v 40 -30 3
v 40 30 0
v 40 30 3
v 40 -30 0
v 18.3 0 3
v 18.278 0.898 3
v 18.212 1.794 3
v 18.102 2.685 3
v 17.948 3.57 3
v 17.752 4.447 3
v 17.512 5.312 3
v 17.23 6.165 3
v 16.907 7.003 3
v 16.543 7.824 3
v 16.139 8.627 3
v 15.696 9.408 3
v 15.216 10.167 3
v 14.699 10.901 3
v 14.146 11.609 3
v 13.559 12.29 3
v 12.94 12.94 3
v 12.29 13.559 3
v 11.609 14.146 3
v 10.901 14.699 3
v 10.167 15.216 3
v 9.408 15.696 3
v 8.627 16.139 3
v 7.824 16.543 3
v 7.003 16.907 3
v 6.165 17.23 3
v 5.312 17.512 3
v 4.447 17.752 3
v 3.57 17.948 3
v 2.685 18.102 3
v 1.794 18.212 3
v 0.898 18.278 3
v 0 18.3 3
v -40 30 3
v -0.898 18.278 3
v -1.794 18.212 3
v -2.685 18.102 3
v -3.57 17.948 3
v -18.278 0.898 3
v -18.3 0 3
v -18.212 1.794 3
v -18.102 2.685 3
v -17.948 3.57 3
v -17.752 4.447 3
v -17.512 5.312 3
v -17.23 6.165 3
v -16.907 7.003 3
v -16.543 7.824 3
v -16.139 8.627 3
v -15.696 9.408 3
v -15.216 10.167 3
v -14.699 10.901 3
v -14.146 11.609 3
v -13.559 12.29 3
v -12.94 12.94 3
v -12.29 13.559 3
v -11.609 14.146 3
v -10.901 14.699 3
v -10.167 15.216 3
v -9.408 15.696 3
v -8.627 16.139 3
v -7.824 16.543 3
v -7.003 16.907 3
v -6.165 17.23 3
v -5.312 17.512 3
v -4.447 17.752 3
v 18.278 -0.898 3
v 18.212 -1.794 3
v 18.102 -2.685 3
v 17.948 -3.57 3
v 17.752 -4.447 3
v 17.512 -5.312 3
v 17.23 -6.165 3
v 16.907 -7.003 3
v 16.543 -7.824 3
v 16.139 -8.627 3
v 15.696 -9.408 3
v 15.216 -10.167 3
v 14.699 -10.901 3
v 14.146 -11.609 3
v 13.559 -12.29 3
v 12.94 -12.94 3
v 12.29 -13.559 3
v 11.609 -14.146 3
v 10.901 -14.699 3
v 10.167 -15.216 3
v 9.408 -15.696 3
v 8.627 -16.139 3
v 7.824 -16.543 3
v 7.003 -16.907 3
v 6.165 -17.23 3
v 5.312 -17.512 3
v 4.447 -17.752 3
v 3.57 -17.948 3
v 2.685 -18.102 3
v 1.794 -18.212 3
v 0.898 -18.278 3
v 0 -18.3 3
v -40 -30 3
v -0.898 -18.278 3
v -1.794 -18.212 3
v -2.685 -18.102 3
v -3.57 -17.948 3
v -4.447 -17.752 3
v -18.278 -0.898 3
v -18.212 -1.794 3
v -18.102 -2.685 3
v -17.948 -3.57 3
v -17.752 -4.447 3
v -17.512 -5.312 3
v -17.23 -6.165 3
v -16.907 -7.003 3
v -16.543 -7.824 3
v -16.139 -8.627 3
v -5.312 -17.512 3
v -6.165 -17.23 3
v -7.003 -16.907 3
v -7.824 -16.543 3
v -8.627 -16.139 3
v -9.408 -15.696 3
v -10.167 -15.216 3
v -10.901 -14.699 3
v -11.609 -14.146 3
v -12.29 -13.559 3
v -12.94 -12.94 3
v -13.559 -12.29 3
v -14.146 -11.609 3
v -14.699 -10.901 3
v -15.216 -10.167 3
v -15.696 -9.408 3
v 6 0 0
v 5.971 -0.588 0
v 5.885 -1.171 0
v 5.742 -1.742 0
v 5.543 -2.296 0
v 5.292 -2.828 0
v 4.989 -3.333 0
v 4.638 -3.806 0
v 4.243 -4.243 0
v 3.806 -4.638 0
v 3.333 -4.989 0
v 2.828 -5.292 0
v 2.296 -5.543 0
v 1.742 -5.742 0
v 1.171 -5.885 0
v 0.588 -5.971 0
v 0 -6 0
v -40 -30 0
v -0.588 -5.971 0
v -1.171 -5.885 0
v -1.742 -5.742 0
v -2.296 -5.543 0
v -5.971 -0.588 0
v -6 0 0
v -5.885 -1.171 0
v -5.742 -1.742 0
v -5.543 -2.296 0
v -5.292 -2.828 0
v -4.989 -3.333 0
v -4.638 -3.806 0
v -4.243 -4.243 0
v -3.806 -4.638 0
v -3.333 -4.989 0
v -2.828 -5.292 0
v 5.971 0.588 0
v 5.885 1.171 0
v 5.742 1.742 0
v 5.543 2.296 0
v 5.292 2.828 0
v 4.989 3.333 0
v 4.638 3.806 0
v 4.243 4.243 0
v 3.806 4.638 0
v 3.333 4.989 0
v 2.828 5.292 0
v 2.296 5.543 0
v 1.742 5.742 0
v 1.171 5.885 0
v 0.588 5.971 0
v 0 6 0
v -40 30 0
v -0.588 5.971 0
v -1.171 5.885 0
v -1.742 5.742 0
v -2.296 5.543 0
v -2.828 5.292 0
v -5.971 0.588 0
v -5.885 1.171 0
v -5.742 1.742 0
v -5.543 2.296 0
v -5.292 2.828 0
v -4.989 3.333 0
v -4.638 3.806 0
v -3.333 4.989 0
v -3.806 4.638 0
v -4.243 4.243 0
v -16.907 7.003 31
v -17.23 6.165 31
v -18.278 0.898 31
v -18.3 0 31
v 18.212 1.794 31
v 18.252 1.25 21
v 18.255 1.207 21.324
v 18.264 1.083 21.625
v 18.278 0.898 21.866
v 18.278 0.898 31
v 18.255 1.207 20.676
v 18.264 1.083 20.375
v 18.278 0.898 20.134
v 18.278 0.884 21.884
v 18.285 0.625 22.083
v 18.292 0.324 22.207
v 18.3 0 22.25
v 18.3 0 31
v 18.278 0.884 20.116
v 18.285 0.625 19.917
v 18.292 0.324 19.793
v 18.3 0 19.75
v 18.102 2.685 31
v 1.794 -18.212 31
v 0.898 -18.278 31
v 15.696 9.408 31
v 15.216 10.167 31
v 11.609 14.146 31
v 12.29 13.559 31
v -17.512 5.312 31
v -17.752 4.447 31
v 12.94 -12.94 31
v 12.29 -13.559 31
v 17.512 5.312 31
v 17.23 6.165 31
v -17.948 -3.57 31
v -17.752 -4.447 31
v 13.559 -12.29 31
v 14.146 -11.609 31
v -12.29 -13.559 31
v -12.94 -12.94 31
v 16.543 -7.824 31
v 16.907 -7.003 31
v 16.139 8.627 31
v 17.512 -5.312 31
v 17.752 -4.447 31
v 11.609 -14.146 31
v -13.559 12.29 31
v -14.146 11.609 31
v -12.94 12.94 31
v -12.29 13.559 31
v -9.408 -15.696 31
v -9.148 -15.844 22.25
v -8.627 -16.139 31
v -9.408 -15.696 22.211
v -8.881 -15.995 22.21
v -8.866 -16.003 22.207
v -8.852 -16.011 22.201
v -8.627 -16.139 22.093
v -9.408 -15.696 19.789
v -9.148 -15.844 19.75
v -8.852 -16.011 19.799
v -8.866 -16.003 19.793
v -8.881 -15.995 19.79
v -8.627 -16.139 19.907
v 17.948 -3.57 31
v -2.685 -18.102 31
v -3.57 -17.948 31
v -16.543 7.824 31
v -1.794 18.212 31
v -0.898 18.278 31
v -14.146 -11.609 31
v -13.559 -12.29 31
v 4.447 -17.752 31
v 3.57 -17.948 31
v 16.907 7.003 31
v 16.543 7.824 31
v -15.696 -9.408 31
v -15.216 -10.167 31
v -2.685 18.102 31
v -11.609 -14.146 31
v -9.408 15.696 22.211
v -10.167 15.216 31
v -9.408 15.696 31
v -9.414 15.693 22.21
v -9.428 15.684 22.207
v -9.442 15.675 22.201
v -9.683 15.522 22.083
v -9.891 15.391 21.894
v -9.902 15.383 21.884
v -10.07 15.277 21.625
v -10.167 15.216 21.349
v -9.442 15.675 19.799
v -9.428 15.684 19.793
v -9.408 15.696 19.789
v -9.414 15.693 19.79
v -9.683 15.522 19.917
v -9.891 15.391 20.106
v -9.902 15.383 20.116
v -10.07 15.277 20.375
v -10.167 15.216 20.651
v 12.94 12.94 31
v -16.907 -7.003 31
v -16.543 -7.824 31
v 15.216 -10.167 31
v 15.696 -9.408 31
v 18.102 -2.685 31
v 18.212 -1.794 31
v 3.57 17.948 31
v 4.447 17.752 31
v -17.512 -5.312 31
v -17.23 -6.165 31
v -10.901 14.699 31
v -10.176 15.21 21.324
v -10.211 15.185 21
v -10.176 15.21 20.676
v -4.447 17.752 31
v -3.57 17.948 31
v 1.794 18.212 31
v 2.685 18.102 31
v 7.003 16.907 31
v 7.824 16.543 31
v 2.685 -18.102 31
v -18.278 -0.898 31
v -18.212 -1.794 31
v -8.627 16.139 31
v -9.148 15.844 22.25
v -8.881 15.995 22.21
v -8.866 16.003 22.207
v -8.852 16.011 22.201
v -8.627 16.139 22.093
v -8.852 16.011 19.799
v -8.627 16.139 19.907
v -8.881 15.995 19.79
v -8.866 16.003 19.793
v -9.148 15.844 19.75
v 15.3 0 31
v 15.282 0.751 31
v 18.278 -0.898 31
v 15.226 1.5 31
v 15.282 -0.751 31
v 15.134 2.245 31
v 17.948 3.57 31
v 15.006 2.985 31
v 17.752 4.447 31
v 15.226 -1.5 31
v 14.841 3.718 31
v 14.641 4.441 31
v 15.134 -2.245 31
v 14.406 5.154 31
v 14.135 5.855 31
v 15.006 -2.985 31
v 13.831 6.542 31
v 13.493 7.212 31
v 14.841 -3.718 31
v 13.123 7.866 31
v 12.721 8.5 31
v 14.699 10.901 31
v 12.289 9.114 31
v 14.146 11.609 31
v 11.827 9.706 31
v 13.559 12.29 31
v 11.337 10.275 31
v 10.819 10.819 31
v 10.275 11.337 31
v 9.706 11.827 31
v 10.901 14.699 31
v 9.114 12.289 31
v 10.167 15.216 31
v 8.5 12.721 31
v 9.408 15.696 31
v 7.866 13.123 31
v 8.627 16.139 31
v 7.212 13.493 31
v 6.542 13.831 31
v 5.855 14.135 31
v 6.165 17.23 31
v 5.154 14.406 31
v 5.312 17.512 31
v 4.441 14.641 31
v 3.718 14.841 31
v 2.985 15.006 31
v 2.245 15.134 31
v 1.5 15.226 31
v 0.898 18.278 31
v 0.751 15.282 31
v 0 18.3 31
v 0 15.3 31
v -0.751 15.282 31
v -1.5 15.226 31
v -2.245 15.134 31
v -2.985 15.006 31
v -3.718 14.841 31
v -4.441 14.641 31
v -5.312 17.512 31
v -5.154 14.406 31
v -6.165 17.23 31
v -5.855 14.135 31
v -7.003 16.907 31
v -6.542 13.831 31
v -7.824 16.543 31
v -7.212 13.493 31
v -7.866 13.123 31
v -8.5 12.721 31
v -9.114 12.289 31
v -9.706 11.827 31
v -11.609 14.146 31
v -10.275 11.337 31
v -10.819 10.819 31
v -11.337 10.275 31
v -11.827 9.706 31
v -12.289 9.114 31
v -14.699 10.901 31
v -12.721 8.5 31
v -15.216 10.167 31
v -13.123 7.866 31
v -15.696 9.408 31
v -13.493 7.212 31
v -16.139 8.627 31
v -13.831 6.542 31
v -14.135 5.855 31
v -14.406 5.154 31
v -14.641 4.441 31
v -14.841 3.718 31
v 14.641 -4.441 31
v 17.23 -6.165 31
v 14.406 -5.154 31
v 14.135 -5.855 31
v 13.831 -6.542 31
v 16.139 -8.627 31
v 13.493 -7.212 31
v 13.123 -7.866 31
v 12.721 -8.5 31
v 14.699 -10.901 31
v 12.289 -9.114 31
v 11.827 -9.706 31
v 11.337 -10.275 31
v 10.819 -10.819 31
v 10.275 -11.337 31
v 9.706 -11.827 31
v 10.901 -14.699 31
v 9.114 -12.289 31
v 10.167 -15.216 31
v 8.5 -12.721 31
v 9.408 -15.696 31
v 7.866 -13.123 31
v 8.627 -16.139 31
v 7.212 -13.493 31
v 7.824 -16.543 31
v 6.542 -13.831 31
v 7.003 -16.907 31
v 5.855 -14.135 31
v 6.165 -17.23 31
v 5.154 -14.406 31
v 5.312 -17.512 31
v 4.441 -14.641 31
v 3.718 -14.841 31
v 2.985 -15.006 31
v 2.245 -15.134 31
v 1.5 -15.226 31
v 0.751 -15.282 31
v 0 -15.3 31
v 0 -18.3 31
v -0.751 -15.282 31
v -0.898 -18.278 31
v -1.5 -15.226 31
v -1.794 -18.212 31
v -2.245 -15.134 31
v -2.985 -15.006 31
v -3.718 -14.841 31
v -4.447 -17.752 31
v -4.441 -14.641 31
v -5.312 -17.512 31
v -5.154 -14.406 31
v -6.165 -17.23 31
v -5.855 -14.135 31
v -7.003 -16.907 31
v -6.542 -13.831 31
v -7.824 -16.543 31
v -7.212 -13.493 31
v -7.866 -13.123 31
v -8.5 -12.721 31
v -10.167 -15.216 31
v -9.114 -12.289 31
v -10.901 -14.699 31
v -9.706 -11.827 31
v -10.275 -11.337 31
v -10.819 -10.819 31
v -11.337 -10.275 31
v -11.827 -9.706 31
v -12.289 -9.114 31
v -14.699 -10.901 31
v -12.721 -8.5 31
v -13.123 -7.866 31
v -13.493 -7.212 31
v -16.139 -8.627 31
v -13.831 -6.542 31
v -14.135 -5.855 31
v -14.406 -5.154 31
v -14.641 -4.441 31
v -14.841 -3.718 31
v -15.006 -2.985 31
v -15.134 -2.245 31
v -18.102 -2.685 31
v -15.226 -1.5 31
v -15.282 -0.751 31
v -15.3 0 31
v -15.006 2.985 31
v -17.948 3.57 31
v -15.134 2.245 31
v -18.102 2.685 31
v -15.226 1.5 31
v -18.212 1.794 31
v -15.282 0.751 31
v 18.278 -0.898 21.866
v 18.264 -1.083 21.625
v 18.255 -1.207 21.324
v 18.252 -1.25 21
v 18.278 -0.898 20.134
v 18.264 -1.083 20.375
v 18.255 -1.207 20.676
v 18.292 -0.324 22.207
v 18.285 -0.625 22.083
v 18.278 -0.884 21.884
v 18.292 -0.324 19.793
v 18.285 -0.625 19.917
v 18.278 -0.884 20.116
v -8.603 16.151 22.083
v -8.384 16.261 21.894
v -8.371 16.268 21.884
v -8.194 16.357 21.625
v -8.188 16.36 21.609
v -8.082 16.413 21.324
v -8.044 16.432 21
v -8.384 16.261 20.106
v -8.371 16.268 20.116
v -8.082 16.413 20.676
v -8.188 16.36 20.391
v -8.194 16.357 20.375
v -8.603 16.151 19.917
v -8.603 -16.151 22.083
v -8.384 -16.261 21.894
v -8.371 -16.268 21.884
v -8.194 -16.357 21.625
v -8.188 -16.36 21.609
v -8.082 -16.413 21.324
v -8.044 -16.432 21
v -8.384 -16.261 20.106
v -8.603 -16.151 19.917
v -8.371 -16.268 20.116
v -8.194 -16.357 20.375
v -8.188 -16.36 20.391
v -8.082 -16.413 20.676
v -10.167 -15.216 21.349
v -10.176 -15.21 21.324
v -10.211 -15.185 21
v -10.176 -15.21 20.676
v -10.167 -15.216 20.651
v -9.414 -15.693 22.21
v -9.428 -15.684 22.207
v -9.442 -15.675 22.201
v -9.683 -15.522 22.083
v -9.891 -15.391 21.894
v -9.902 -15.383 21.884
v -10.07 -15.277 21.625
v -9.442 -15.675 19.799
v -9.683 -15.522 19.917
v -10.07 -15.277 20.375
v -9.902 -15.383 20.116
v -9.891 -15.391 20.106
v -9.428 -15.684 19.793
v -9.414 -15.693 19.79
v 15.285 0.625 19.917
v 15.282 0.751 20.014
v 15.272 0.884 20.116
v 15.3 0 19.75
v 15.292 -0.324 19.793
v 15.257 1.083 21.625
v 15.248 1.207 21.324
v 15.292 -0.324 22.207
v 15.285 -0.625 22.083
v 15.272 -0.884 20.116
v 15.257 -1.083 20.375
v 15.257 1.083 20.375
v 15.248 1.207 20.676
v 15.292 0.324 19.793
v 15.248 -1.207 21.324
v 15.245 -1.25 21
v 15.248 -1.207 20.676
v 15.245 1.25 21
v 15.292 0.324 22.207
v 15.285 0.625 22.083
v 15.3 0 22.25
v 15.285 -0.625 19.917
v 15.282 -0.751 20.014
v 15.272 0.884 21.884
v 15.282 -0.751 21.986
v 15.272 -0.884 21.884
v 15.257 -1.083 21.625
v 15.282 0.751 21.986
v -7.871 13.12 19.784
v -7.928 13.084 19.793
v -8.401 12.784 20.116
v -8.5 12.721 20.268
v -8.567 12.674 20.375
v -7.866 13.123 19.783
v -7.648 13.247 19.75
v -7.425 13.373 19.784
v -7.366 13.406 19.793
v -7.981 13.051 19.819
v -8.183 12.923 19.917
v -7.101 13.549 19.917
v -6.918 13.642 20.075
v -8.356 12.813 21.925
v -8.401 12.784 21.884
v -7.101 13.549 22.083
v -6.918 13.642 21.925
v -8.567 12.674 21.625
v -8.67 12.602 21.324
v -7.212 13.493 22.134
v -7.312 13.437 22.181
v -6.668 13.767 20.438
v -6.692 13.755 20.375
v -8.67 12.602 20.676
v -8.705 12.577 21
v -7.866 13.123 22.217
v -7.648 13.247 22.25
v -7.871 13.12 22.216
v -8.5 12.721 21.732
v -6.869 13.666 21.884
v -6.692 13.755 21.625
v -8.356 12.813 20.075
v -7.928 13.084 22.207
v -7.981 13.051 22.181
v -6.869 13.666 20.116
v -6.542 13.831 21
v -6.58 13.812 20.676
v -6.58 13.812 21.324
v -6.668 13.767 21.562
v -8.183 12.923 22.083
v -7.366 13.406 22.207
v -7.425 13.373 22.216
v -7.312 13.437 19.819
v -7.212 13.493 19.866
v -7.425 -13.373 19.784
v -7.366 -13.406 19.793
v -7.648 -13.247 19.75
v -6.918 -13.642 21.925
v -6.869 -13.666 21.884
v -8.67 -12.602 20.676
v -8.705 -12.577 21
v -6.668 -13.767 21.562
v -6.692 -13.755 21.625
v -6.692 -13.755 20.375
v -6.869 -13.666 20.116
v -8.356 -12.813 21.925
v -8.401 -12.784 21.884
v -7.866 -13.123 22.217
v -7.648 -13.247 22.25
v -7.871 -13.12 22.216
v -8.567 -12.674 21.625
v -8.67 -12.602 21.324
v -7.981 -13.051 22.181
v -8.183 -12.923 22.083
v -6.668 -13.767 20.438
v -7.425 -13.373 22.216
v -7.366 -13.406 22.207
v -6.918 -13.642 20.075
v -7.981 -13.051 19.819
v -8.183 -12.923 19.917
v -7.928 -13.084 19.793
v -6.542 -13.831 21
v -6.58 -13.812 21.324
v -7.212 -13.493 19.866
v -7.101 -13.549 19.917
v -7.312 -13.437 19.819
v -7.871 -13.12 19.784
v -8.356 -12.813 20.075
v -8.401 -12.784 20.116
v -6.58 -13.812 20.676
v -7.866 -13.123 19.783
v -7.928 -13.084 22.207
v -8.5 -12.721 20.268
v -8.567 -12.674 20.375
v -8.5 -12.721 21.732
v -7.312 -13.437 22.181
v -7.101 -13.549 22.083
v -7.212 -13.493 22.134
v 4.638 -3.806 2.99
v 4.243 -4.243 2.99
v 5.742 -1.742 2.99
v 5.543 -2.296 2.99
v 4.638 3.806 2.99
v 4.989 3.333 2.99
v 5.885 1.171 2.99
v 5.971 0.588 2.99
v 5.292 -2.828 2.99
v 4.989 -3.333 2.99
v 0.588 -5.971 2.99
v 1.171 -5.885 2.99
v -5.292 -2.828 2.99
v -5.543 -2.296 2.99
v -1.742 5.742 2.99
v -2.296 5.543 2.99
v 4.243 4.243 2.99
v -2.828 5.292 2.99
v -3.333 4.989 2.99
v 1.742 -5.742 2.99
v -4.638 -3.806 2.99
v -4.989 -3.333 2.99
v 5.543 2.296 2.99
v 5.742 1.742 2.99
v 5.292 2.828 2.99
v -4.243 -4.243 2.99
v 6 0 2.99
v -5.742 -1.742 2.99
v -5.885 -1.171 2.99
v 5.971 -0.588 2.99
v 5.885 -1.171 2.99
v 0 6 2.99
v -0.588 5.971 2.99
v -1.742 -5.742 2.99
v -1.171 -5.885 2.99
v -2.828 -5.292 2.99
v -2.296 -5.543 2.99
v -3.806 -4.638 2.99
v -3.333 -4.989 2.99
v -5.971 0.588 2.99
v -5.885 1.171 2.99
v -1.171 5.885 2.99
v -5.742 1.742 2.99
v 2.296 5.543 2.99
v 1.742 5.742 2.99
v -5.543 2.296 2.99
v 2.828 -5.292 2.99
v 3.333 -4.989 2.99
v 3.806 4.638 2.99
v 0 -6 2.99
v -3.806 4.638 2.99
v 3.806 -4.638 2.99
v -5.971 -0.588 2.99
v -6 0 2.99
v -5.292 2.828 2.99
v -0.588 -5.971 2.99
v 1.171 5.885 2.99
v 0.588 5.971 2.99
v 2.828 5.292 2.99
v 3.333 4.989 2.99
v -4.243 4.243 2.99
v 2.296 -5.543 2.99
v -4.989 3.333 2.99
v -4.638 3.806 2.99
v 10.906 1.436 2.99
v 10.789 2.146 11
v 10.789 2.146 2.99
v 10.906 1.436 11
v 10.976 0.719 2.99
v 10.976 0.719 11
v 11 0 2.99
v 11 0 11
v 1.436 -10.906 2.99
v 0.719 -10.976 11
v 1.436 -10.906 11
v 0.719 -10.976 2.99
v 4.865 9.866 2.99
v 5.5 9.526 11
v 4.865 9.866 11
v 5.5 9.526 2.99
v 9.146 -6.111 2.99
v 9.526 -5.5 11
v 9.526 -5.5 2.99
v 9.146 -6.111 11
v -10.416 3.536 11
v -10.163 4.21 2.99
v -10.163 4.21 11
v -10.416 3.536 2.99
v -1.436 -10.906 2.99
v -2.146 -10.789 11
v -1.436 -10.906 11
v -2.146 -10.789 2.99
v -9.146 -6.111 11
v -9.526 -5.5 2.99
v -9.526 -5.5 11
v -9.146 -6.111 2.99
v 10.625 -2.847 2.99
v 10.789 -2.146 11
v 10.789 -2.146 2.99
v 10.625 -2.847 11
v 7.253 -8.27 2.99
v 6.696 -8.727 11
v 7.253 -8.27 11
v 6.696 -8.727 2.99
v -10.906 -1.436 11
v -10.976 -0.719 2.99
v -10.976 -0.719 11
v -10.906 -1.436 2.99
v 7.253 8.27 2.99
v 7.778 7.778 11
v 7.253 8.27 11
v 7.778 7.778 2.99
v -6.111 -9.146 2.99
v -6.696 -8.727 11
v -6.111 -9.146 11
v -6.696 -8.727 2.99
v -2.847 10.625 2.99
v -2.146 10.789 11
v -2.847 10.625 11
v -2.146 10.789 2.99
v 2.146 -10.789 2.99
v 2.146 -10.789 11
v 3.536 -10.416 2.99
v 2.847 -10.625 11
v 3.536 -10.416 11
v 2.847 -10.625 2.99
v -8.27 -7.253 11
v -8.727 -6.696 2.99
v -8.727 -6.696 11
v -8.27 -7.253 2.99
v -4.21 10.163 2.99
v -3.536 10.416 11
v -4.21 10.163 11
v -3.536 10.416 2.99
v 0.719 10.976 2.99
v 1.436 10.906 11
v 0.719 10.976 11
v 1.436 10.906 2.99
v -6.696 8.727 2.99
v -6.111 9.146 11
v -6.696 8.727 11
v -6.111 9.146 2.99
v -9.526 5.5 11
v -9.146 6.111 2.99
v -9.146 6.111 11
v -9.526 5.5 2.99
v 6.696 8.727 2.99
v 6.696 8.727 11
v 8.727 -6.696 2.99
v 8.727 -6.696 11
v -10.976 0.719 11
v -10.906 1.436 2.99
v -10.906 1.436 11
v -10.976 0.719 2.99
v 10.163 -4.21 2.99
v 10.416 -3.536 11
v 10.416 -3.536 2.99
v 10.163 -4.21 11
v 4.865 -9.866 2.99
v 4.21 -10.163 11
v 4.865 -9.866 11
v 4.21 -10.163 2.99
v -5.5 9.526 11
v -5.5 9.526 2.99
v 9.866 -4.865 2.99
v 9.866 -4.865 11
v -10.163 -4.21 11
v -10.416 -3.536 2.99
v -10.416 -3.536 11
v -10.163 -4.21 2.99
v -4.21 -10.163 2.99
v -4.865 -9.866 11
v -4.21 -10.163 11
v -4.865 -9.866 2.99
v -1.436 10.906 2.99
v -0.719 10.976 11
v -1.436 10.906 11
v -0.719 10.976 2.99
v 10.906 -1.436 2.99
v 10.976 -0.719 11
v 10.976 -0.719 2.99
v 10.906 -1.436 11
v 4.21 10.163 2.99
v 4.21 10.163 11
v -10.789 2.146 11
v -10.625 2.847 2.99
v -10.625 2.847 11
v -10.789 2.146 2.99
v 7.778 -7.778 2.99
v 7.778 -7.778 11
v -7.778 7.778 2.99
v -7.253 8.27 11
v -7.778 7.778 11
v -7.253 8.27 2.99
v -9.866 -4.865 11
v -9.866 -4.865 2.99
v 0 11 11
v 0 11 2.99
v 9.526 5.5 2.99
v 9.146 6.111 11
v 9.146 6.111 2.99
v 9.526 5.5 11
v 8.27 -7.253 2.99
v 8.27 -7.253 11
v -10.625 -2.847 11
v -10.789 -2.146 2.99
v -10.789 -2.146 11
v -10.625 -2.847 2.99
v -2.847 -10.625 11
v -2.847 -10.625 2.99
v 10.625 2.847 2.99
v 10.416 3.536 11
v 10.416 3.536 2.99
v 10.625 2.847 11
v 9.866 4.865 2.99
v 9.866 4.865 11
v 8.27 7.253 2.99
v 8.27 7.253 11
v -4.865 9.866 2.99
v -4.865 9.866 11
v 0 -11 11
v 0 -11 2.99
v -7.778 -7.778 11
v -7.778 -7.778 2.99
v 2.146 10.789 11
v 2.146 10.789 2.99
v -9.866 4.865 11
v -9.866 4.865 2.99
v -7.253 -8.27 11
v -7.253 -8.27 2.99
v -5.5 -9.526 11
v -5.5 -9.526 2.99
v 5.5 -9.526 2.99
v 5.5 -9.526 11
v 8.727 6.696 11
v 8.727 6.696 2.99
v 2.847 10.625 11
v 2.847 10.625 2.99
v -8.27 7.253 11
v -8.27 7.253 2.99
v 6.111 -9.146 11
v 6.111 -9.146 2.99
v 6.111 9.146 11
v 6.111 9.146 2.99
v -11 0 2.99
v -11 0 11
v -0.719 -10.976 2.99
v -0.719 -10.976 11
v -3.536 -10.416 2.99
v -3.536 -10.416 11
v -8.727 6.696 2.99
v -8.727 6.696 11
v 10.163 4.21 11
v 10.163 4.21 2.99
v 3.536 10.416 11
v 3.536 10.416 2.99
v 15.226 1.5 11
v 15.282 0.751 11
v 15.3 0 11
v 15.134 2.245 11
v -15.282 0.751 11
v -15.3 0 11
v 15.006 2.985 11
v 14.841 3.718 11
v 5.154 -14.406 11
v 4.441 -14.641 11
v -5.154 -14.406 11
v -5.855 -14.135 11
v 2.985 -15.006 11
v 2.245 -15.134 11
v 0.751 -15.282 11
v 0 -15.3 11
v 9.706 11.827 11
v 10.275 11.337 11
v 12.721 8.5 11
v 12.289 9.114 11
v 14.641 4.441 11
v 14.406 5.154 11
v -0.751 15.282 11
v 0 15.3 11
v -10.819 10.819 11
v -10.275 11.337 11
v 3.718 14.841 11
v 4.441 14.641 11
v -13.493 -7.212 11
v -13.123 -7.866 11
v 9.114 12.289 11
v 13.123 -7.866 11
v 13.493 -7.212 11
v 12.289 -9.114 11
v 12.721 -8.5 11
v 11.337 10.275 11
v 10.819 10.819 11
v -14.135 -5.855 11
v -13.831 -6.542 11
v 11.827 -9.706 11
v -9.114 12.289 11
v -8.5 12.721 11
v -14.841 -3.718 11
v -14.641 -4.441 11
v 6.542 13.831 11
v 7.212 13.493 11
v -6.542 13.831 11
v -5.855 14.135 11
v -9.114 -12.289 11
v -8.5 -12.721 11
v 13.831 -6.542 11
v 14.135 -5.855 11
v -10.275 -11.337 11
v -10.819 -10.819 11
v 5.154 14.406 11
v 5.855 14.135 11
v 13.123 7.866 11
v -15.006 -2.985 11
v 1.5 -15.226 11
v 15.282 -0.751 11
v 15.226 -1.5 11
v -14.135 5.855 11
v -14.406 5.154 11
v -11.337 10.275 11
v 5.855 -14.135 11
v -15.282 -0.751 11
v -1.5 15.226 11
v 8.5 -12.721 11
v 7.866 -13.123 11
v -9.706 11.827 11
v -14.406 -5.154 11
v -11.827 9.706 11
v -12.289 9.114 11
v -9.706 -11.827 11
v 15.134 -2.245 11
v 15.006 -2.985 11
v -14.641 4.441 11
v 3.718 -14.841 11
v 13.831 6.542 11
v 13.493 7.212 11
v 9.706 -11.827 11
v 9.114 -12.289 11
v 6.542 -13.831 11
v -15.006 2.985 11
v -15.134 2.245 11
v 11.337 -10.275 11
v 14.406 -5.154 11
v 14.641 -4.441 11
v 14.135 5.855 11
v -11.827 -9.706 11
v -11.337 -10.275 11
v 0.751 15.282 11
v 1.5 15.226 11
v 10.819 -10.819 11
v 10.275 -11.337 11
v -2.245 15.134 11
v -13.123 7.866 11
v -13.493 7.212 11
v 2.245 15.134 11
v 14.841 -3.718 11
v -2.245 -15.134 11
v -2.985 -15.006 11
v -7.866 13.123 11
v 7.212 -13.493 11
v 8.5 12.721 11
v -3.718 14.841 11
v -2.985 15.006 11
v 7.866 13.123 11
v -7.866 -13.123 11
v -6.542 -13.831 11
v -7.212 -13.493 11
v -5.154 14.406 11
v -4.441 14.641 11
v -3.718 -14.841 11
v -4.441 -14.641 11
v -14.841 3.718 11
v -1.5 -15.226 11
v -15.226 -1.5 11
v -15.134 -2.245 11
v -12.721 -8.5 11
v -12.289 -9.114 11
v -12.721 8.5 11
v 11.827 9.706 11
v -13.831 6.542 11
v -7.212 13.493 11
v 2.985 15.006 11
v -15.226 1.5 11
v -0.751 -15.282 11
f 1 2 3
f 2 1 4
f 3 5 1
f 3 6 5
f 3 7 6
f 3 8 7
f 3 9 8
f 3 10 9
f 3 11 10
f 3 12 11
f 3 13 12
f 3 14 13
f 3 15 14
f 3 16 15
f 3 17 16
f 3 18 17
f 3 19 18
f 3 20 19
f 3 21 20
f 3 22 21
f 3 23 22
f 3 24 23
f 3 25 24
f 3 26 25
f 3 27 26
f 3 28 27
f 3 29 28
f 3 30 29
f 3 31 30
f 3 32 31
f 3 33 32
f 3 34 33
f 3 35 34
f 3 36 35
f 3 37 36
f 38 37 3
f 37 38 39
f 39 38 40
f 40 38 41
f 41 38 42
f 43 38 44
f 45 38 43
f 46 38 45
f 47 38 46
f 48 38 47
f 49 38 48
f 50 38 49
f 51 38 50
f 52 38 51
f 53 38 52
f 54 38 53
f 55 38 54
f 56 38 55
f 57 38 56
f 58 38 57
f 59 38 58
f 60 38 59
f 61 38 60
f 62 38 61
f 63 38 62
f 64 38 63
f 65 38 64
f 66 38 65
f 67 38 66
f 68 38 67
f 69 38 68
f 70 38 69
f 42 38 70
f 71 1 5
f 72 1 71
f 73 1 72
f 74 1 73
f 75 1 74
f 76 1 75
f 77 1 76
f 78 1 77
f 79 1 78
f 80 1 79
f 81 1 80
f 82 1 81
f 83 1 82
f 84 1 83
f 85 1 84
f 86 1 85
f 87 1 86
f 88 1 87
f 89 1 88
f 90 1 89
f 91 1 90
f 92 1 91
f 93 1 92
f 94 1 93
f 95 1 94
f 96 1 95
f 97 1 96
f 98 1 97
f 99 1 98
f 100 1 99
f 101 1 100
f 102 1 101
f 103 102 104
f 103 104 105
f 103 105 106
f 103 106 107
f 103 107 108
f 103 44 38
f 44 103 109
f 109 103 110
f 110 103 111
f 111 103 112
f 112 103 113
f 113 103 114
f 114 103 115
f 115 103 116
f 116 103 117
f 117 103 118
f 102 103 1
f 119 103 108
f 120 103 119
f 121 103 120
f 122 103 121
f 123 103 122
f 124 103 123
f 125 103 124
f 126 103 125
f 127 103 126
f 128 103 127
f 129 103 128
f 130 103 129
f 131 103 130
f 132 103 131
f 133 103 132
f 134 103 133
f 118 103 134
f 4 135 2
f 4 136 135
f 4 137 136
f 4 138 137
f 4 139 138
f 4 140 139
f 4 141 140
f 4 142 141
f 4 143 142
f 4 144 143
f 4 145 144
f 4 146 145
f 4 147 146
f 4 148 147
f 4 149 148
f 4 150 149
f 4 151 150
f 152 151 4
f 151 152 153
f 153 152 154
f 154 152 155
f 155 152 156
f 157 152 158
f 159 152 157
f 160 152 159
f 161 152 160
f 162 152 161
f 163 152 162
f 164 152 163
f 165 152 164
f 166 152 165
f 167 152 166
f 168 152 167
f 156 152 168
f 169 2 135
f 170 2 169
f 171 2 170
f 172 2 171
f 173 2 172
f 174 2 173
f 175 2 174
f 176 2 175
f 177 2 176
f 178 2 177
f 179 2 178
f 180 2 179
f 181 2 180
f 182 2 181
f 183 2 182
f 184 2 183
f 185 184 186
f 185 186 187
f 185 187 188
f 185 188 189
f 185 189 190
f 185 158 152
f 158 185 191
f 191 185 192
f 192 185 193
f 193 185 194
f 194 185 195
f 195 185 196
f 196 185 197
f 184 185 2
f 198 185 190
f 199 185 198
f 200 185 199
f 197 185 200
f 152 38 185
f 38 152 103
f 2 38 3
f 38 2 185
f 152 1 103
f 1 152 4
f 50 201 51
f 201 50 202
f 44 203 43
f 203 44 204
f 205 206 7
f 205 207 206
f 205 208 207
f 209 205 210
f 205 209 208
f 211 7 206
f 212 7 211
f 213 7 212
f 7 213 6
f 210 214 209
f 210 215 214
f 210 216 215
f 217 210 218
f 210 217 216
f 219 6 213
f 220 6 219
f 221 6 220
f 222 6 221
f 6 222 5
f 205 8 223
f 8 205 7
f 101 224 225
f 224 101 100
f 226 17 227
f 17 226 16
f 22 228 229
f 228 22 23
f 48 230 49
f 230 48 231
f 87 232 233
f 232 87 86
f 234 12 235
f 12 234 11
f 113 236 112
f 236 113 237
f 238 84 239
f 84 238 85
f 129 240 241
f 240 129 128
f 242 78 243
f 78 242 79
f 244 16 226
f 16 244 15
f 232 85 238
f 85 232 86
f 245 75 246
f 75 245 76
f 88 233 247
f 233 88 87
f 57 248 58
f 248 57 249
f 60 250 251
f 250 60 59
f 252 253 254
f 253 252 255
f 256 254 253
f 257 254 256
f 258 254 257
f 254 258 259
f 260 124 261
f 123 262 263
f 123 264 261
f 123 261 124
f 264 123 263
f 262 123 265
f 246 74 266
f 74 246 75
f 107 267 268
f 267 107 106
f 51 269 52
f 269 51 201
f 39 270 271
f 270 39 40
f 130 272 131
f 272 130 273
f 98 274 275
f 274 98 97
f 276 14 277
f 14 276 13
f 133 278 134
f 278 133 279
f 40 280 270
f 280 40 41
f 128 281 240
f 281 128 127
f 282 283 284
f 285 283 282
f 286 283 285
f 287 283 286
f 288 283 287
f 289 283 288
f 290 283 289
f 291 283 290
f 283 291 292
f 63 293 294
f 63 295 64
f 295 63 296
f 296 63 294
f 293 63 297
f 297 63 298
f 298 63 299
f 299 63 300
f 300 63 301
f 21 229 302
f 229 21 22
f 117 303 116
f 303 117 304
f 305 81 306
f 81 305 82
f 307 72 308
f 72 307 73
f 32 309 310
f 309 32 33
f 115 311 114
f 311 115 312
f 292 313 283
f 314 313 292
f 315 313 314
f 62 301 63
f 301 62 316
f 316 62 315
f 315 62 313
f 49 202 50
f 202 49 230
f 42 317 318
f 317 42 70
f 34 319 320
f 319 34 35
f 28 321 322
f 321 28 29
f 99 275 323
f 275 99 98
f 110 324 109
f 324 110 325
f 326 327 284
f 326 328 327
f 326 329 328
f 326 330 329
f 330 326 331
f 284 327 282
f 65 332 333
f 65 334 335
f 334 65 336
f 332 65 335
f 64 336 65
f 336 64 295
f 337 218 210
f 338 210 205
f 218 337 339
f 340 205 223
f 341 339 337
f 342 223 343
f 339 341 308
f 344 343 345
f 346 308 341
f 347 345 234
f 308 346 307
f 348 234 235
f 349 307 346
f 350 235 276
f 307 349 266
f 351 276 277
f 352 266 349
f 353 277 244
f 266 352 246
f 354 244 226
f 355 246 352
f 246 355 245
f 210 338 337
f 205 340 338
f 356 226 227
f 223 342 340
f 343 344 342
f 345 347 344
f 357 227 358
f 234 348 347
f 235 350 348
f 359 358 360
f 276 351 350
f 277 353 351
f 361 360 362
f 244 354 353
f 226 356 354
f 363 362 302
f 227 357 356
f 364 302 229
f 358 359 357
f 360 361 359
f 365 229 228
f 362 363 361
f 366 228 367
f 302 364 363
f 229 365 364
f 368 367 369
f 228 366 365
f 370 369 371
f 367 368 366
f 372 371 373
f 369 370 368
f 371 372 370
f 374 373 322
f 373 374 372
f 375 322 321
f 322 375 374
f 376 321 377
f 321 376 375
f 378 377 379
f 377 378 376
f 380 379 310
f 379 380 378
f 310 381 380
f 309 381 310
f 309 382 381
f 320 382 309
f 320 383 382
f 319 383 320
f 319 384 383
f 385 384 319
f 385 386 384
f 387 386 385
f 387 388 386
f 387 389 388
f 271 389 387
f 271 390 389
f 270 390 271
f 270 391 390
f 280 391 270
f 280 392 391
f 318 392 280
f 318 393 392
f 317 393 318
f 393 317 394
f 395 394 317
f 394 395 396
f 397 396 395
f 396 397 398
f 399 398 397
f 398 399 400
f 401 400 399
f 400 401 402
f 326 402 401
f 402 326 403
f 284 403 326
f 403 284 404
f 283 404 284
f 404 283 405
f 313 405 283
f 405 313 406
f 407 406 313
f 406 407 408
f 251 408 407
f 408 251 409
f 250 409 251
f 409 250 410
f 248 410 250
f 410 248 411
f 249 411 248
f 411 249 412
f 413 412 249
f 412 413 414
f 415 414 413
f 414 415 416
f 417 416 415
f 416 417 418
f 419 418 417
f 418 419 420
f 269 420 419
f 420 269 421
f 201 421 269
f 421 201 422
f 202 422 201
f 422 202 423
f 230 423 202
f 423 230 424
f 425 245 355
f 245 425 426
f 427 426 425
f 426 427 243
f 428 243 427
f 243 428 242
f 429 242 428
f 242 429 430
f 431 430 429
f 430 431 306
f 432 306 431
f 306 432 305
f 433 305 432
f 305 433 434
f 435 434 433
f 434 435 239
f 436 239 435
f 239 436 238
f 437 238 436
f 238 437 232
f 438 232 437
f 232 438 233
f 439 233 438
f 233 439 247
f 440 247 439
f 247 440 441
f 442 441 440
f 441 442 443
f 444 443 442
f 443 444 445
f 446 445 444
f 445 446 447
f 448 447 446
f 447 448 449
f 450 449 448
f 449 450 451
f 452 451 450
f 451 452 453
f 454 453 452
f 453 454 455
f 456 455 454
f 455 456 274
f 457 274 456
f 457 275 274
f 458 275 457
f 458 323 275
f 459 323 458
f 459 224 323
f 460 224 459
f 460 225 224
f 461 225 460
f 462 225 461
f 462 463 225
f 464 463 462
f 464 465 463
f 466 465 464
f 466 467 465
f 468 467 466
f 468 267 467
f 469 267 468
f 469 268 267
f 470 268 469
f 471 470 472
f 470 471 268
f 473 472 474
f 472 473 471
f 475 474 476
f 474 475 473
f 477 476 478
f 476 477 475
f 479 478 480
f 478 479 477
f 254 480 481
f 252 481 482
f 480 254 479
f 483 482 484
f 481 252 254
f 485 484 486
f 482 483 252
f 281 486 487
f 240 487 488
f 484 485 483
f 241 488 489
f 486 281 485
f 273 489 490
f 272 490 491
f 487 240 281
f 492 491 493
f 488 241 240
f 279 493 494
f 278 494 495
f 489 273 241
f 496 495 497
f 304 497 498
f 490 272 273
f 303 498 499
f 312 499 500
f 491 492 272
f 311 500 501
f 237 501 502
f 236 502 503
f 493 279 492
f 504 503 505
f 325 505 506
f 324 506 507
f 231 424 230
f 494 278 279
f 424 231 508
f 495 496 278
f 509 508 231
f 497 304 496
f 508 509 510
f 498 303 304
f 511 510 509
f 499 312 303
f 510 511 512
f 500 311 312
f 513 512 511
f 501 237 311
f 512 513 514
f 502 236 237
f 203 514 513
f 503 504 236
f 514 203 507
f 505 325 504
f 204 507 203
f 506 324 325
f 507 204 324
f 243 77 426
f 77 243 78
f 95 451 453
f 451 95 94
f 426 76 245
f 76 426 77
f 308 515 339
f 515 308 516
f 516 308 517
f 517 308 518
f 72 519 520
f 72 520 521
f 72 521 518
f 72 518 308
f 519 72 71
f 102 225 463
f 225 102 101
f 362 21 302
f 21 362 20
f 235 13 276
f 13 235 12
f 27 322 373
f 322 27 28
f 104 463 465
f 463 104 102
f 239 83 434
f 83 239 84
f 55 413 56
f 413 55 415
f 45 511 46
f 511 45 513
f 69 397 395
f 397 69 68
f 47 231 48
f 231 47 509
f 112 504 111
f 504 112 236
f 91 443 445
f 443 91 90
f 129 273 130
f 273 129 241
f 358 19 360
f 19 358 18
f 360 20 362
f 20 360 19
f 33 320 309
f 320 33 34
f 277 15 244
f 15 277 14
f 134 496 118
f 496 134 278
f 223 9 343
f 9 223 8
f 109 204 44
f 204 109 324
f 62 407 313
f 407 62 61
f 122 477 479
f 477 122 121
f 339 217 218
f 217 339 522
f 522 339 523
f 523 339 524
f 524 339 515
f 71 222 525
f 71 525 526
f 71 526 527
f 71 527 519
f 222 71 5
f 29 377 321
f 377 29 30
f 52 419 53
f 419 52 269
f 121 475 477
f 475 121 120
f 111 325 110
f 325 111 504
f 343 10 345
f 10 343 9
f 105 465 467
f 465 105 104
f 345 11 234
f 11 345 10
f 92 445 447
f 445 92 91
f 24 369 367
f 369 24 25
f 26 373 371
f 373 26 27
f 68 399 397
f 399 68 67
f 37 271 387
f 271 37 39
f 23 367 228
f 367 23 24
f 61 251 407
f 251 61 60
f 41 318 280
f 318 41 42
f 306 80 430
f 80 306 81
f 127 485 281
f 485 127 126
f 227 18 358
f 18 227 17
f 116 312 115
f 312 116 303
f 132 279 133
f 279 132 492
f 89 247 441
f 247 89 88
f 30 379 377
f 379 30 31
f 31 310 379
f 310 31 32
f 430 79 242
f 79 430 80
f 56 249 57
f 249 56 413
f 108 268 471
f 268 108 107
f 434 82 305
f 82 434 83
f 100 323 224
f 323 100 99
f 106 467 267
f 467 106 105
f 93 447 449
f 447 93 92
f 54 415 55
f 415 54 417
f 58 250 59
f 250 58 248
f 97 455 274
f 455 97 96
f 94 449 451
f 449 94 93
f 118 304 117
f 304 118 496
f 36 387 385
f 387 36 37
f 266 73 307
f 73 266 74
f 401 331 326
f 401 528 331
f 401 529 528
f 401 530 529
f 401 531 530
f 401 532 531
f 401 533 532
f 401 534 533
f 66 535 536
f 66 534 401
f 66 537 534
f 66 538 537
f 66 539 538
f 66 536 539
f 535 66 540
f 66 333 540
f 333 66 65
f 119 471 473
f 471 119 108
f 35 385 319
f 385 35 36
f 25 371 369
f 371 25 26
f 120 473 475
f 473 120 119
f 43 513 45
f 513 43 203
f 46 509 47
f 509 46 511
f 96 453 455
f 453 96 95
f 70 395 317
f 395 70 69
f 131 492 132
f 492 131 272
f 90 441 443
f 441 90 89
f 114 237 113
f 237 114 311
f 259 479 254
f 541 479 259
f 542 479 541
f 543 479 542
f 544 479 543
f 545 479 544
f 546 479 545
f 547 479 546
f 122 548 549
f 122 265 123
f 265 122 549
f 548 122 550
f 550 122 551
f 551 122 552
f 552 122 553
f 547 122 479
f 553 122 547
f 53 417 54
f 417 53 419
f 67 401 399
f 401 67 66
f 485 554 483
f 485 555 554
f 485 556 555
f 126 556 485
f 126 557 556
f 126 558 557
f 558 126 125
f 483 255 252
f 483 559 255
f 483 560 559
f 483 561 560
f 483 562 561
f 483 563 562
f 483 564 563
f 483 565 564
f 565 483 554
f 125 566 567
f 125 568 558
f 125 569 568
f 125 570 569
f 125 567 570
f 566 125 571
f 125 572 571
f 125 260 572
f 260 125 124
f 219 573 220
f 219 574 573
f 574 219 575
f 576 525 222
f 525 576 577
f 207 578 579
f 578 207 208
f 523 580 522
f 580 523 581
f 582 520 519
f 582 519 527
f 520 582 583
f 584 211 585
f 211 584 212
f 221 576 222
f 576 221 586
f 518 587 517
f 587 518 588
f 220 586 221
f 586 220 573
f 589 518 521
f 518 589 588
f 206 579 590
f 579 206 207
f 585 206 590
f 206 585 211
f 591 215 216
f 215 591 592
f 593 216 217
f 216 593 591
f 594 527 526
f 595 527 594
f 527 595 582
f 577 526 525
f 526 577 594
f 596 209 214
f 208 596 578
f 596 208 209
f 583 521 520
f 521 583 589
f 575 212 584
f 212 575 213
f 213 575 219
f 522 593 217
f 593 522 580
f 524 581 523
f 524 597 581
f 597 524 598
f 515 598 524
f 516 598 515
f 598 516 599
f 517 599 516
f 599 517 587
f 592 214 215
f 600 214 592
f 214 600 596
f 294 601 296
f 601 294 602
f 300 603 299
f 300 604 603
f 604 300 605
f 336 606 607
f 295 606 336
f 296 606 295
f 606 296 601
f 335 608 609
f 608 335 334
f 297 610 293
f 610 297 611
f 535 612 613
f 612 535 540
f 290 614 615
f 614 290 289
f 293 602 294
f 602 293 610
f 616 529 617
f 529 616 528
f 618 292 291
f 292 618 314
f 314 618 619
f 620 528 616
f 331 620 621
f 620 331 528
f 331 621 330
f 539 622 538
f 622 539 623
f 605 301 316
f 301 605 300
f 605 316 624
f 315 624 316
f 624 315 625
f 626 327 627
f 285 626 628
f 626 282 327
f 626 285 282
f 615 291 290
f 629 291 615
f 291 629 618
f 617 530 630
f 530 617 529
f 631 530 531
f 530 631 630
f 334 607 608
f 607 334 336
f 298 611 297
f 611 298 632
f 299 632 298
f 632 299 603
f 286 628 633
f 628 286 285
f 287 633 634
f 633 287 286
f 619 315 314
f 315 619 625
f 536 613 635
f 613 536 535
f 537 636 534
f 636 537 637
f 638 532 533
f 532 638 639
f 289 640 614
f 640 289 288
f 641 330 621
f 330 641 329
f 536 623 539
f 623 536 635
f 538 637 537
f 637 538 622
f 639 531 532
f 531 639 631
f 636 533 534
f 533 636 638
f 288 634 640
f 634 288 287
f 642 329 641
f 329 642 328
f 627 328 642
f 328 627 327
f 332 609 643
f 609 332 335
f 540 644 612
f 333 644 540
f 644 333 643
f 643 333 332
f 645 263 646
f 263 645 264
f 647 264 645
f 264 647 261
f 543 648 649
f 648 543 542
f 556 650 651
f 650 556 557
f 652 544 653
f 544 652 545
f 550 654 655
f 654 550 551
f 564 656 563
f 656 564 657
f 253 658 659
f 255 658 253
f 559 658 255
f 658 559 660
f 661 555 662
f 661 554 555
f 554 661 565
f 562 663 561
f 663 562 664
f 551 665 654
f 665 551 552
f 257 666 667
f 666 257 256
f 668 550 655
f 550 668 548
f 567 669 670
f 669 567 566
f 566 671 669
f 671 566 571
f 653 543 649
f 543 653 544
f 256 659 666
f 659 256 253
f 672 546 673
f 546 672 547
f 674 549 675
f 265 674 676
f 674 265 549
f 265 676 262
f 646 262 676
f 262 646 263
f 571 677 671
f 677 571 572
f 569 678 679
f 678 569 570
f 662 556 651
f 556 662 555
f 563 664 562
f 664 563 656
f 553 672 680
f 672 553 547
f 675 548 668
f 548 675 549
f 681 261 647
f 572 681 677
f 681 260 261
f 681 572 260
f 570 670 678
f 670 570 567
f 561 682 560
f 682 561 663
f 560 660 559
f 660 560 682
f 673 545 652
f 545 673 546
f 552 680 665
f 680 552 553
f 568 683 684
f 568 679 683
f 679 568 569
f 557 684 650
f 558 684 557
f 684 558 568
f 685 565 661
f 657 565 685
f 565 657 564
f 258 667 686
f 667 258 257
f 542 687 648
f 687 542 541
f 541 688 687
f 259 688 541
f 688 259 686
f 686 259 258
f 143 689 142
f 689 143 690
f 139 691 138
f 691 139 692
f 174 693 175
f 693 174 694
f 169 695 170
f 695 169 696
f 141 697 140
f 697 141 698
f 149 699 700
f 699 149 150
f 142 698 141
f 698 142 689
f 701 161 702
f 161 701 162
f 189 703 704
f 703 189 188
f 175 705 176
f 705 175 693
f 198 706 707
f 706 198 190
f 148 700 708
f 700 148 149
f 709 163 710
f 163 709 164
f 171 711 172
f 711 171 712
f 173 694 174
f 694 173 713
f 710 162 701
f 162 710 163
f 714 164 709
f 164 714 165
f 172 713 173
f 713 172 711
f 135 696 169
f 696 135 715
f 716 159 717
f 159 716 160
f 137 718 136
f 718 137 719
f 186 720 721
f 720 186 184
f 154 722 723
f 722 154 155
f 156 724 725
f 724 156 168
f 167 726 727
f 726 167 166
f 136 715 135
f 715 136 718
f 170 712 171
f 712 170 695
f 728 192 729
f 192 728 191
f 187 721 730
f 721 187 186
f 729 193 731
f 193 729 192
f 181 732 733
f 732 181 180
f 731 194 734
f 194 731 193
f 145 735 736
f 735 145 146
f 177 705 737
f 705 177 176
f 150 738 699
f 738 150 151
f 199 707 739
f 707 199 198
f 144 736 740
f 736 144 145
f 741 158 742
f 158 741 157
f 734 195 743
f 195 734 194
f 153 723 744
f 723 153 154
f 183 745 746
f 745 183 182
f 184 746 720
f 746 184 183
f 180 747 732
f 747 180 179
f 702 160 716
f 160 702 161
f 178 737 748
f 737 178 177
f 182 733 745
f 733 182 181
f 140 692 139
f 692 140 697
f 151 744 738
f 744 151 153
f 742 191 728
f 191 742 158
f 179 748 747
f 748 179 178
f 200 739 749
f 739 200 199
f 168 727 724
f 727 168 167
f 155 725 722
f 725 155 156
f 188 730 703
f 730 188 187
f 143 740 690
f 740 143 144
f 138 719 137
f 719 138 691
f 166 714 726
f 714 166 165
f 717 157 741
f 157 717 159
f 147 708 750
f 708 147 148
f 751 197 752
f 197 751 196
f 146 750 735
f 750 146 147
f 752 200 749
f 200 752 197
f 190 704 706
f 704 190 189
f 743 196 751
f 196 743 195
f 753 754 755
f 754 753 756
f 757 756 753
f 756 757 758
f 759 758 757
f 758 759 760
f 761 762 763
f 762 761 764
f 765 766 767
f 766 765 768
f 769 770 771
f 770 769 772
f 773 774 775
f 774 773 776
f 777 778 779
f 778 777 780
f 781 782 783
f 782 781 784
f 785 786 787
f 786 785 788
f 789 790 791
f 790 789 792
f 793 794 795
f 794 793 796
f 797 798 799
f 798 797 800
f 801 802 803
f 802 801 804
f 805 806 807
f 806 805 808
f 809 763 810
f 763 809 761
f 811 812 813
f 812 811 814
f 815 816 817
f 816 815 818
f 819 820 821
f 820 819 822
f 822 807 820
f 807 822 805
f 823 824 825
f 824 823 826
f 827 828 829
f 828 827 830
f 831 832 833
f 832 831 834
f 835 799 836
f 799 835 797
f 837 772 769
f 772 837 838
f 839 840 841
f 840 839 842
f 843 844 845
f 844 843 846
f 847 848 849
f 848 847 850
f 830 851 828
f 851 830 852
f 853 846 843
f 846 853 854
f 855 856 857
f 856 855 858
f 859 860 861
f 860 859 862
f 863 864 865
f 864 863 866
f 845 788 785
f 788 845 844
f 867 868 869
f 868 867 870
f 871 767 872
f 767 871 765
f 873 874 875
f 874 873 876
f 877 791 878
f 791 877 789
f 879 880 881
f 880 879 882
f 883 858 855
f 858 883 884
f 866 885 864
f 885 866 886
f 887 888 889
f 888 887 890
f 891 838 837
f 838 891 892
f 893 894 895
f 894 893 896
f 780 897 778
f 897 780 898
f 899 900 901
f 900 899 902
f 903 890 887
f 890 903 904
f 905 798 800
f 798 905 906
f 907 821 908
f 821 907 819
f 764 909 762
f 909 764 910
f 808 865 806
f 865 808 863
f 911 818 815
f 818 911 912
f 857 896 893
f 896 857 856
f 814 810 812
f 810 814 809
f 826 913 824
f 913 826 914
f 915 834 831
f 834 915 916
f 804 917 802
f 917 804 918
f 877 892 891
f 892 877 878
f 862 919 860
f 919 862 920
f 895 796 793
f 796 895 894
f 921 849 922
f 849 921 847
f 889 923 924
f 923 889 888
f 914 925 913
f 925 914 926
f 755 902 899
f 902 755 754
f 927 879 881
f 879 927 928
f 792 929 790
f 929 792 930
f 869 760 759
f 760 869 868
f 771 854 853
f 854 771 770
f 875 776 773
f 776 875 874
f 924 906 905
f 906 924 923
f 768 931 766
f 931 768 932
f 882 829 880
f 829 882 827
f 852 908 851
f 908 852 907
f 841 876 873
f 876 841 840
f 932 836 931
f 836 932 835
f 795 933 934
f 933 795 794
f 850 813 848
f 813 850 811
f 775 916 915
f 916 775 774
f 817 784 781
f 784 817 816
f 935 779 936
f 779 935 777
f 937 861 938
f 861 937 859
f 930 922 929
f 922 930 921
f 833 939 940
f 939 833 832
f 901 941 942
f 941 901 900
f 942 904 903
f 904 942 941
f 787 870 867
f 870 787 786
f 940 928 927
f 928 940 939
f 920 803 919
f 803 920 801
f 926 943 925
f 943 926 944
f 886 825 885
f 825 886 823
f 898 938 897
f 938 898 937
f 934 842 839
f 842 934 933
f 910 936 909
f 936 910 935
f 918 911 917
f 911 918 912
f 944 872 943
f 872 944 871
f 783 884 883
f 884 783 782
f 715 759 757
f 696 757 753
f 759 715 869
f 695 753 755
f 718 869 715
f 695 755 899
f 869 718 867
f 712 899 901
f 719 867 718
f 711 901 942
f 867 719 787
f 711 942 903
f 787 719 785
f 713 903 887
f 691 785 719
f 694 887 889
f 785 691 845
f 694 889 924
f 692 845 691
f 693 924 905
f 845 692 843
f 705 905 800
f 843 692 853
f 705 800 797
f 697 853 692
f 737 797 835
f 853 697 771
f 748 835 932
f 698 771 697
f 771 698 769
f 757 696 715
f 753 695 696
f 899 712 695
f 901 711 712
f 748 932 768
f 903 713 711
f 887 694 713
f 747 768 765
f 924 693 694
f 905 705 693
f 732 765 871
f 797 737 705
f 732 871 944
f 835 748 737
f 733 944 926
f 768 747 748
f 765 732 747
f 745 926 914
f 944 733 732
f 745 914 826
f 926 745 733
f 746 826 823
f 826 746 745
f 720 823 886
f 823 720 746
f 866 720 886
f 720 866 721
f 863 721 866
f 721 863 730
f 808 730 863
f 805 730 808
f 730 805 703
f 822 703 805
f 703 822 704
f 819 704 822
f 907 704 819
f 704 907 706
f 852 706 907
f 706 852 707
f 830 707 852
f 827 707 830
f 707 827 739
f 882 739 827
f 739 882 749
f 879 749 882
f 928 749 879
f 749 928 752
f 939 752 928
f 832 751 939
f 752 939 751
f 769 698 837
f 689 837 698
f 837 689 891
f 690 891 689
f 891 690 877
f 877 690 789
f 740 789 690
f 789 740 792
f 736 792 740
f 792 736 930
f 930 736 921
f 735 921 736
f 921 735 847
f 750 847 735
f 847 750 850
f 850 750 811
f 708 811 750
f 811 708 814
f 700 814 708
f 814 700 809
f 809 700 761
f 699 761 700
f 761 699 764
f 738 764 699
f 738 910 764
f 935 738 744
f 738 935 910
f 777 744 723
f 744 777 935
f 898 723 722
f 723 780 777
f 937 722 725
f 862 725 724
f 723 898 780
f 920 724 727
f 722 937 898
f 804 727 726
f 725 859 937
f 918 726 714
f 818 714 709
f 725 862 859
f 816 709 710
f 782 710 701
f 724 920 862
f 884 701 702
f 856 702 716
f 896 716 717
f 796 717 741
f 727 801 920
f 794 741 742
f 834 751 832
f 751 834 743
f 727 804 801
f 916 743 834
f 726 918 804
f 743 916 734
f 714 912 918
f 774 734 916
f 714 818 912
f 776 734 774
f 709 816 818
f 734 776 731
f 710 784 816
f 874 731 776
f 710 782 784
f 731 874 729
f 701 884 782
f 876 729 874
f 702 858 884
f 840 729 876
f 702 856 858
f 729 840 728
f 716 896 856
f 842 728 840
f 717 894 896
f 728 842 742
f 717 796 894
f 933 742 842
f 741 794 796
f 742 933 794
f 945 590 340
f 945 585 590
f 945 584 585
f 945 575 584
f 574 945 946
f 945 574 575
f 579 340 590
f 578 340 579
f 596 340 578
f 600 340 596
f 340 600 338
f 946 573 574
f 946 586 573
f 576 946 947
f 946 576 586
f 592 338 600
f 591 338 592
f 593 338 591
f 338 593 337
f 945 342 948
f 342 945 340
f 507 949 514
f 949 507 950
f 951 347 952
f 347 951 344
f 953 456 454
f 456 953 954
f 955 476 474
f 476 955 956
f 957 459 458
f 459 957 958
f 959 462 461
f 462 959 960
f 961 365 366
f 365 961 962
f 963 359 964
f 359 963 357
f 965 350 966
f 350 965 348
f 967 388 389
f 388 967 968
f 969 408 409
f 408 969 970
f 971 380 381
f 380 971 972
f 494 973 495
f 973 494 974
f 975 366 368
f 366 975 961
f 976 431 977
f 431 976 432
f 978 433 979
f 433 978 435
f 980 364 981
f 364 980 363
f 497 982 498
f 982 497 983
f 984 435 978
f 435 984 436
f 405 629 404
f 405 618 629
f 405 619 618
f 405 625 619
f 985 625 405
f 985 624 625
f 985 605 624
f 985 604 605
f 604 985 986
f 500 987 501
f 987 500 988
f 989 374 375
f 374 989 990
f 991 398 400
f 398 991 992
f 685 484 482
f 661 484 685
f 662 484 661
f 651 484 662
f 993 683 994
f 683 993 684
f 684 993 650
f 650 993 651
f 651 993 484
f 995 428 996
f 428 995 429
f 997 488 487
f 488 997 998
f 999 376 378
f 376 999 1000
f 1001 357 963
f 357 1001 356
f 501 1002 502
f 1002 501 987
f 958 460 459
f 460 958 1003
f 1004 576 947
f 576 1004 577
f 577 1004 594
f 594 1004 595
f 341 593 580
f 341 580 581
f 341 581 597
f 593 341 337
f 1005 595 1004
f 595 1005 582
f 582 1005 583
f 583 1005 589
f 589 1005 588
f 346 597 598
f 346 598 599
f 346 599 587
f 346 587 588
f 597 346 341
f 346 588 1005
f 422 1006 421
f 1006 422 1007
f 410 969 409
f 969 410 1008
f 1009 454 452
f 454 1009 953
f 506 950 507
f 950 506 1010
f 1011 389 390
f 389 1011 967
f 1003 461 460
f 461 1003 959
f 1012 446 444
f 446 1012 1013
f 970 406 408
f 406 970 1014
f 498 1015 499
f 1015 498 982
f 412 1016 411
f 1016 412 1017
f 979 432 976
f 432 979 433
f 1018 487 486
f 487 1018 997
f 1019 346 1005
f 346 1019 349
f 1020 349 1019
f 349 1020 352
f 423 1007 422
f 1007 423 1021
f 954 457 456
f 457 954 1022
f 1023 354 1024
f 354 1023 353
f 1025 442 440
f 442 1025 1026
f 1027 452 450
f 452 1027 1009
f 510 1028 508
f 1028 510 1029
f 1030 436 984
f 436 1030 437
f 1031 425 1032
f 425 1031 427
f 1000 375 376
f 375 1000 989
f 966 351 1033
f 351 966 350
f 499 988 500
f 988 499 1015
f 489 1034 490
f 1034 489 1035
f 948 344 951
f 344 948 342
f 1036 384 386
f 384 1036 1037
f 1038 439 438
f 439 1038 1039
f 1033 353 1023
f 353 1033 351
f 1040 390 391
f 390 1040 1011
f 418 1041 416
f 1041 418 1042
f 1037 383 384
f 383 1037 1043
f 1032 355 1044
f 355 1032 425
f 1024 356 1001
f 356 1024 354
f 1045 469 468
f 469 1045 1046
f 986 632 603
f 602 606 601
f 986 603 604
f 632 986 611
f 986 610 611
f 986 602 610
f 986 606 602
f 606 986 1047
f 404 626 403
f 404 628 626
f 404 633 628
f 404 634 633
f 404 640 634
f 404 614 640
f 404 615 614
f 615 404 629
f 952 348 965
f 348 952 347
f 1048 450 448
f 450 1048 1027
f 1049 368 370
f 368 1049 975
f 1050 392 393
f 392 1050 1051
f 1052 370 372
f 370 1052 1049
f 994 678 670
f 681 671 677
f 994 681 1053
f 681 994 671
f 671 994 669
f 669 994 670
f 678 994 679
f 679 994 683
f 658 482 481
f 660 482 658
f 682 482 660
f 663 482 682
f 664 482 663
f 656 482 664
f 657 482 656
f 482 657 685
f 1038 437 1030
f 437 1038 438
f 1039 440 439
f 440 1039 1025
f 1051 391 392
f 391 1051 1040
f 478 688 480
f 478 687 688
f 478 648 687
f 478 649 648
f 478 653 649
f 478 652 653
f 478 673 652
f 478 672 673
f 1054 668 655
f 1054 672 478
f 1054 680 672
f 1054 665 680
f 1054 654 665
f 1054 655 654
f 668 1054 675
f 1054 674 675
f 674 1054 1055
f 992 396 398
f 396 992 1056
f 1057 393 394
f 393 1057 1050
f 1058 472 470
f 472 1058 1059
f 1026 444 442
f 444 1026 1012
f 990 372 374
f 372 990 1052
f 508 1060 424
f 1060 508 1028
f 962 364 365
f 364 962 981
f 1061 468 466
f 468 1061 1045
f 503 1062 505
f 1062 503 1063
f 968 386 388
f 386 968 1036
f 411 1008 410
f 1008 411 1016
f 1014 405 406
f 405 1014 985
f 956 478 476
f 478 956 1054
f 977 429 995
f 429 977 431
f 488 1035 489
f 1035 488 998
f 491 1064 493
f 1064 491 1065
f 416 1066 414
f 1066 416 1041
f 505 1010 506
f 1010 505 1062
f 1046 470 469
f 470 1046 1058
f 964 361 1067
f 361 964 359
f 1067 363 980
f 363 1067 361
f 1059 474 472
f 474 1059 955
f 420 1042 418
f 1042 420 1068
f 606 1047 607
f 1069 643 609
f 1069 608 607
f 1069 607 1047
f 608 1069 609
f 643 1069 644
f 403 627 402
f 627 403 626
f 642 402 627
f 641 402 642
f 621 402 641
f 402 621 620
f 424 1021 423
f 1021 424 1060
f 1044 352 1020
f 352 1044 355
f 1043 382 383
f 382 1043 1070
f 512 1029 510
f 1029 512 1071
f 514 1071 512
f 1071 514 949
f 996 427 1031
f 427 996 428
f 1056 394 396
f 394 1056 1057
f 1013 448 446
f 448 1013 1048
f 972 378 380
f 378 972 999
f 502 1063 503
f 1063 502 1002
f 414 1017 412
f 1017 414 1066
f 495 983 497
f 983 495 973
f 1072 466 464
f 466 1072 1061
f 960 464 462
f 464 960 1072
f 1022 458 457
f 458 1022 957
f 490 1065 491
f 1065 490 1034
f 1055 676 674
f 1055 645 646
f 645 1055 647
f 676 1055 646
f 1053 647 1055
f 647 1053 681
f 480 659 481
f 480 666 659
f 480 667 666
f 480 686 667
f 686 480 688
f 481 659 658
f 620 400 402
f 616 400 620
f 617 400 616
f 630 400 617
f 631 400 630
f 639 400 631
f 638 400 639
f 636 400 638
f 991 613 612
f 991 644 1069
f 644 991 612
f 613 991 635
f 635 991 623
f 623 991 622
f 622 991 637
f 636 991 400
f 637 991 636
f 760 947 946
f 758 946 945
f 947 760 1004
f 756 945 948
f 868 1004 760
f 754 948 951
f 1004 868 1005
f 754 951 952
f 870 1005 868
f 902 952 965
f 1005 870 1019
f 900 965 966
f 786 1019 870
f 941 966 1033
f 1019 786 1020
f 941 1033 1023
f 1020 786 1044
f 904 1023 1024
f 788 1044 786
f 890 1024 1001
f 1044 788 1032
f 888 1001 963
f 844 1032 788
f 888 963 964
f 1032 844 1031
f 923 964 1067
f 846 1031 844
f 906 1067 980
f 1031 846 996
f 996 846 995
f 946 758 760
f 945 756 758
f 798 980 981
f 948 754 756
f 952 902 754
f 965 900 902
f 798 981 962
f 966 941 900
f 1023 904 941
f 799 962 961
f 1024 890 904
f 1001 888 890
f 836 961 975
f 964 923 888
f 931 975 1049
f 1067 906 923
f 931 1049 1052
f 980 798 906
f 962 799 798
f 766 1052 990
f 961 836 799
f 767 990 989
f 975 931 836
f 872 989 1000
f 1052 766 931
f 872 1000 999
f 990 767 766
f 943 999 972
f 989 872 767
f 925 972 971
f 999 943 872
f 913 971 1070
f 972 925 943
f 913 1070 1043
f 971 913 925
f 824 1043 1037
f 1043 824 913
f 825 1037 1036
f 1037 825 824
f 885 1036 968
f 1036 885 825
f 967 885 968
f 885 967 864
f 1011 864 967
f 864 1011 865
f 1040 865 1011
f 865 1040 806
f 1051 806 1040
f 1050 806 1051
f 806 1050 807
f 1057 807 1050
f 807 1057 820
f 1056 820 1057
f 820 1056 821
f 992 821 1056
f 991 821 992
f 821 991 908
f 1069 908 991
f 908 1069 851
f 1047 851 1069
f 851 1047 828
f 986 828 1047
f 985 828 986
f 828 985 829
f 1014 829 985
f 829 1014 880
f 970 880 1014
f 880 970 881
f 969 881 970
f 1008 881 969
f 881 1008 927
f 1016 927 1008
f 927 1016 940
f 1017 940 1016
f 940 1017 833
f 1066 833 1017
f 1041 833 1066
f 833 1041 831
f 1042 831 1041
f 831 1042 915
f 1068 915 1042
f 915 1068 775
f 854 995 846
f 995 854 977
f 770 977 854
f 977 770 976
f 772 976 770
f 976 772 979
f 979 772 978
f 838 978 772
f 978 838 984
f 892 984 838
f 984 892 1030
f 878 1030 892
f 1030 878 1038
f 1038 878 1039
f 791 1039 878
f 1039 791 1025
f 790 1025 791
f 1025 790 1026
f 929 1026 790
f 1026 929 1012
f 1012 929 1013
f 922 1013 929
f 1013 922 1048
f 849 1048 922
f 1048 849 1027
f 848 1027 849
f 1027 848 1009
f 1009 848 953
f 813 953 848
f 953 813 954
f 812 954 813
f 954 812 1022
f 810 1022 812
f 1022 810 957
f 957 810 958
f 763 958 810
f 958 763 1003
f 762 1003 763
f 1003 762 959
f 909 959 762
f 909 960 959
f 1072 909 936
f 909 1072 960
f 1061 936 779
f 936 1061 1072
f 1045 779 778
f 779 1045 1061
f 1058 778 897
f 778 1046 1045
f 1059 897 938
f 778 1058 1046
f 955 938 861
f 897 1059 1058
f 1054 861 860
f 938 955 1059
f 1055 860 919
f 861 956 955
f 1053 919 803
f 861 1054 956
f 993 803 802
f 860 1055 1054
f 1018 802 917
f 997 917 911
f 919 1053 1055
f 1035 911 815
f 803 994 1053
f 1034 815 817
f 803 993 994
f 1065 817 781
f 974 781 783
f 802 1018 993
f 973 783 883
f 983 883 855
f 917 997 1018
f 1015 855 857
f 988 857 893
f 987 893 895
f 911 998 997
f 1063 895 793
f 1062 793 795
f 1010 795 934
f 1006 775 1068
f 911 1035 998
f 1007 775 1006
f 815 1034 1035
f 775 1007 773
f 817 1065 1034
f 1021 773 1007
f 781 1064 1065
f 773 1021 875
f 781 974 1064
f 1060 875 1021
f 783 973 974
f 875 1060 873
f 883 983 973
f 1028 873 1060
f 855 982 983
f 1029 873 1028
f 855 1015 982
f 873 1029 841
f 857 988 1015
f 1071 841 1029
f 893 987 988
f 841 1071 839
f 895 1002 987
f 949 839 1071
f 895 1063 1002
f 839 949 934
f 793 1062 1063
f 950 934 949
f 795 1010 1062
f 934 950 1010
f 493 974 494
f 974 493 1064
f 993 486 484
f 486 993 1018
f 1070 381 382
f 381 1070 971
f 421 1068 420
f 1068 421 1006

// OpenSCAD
// KNOWN-WRONG PART (must fail): camera hole and sleeve at the centre of the plate instead of x = -20, y = 10
// Phone adapter for a microscope eyepiece with a 30 mm outer diameter
// Category: hardware. A phone plate with an off-centre camera hole and, on the same axis, a sleeve
// that slides over the eyepiece. The sleeve bore steps down to 22 mm near the plate (a stop that
// fixes the camera-to-eyepiece distance); three radial M3 holes take centring screws.
// Print: PLA or PETG, phone side (plate) on the bed, 0.2 mm layers; tap the 2.5 mm holes for M3
// nylon screws. Hold the phone on the plate with rubber bands.
// SPDX-License-Identifier: CERN-OHL-P-2.0

/* [Adapter] */
plate = [80, 60, 3];      // X, Y, thickness [mm], centred on the origin
cam = [0, 0];             // camera-hole axis
cam_d = 12;
sleeve_od = 36.6;
stop_d = 22;              // bore from z = 3 to 11
stop_top = 11;
bore_d = 30.6;            // bore from z = 11 to the top (30 mm eyepiece + clearance)
sleeve_top = 31;
screw_d = 2.5;            // M3 tapping holes
screw_z = 21;
screw_angles = [0, 120, 240];  // first one points in +X

/* [Hidden] */
eps = 0.01;

difference() {
    union() {
        translate([-plate.x / 2, -plate.y / 2, 0]) cube(plate);
        translate([cam.x, cam.y, plate.z - eps]) cylinder(d = sleeve_od, h = sleeve_top - plate.z + eps, $fn = 128);
    }
    translate([cam.x, cam.y, -1]) cylinder(d = cam_d, h = plate.z + 2, $fn = 64);
    translate([cam.x, cam.y, plate.z - eps]) cylinder(d = stop_d, h = stop_top - plate.z + 2 * eps, $fn = 96);
    translate([cam.x, cam.y, stop_top]) cylinder(d = bore_d, h = sleeve_top - stop_top + 1, $fn = 128);
    for (a = screw_angles)
        translate([cam.x, cam.y, screw_z]) rotate([0, 0, a]) rotate([0, 90, 0])
            cylinder(d = screw_d, h = sleeve_od / 2 + 1, $fn = 24);
}
